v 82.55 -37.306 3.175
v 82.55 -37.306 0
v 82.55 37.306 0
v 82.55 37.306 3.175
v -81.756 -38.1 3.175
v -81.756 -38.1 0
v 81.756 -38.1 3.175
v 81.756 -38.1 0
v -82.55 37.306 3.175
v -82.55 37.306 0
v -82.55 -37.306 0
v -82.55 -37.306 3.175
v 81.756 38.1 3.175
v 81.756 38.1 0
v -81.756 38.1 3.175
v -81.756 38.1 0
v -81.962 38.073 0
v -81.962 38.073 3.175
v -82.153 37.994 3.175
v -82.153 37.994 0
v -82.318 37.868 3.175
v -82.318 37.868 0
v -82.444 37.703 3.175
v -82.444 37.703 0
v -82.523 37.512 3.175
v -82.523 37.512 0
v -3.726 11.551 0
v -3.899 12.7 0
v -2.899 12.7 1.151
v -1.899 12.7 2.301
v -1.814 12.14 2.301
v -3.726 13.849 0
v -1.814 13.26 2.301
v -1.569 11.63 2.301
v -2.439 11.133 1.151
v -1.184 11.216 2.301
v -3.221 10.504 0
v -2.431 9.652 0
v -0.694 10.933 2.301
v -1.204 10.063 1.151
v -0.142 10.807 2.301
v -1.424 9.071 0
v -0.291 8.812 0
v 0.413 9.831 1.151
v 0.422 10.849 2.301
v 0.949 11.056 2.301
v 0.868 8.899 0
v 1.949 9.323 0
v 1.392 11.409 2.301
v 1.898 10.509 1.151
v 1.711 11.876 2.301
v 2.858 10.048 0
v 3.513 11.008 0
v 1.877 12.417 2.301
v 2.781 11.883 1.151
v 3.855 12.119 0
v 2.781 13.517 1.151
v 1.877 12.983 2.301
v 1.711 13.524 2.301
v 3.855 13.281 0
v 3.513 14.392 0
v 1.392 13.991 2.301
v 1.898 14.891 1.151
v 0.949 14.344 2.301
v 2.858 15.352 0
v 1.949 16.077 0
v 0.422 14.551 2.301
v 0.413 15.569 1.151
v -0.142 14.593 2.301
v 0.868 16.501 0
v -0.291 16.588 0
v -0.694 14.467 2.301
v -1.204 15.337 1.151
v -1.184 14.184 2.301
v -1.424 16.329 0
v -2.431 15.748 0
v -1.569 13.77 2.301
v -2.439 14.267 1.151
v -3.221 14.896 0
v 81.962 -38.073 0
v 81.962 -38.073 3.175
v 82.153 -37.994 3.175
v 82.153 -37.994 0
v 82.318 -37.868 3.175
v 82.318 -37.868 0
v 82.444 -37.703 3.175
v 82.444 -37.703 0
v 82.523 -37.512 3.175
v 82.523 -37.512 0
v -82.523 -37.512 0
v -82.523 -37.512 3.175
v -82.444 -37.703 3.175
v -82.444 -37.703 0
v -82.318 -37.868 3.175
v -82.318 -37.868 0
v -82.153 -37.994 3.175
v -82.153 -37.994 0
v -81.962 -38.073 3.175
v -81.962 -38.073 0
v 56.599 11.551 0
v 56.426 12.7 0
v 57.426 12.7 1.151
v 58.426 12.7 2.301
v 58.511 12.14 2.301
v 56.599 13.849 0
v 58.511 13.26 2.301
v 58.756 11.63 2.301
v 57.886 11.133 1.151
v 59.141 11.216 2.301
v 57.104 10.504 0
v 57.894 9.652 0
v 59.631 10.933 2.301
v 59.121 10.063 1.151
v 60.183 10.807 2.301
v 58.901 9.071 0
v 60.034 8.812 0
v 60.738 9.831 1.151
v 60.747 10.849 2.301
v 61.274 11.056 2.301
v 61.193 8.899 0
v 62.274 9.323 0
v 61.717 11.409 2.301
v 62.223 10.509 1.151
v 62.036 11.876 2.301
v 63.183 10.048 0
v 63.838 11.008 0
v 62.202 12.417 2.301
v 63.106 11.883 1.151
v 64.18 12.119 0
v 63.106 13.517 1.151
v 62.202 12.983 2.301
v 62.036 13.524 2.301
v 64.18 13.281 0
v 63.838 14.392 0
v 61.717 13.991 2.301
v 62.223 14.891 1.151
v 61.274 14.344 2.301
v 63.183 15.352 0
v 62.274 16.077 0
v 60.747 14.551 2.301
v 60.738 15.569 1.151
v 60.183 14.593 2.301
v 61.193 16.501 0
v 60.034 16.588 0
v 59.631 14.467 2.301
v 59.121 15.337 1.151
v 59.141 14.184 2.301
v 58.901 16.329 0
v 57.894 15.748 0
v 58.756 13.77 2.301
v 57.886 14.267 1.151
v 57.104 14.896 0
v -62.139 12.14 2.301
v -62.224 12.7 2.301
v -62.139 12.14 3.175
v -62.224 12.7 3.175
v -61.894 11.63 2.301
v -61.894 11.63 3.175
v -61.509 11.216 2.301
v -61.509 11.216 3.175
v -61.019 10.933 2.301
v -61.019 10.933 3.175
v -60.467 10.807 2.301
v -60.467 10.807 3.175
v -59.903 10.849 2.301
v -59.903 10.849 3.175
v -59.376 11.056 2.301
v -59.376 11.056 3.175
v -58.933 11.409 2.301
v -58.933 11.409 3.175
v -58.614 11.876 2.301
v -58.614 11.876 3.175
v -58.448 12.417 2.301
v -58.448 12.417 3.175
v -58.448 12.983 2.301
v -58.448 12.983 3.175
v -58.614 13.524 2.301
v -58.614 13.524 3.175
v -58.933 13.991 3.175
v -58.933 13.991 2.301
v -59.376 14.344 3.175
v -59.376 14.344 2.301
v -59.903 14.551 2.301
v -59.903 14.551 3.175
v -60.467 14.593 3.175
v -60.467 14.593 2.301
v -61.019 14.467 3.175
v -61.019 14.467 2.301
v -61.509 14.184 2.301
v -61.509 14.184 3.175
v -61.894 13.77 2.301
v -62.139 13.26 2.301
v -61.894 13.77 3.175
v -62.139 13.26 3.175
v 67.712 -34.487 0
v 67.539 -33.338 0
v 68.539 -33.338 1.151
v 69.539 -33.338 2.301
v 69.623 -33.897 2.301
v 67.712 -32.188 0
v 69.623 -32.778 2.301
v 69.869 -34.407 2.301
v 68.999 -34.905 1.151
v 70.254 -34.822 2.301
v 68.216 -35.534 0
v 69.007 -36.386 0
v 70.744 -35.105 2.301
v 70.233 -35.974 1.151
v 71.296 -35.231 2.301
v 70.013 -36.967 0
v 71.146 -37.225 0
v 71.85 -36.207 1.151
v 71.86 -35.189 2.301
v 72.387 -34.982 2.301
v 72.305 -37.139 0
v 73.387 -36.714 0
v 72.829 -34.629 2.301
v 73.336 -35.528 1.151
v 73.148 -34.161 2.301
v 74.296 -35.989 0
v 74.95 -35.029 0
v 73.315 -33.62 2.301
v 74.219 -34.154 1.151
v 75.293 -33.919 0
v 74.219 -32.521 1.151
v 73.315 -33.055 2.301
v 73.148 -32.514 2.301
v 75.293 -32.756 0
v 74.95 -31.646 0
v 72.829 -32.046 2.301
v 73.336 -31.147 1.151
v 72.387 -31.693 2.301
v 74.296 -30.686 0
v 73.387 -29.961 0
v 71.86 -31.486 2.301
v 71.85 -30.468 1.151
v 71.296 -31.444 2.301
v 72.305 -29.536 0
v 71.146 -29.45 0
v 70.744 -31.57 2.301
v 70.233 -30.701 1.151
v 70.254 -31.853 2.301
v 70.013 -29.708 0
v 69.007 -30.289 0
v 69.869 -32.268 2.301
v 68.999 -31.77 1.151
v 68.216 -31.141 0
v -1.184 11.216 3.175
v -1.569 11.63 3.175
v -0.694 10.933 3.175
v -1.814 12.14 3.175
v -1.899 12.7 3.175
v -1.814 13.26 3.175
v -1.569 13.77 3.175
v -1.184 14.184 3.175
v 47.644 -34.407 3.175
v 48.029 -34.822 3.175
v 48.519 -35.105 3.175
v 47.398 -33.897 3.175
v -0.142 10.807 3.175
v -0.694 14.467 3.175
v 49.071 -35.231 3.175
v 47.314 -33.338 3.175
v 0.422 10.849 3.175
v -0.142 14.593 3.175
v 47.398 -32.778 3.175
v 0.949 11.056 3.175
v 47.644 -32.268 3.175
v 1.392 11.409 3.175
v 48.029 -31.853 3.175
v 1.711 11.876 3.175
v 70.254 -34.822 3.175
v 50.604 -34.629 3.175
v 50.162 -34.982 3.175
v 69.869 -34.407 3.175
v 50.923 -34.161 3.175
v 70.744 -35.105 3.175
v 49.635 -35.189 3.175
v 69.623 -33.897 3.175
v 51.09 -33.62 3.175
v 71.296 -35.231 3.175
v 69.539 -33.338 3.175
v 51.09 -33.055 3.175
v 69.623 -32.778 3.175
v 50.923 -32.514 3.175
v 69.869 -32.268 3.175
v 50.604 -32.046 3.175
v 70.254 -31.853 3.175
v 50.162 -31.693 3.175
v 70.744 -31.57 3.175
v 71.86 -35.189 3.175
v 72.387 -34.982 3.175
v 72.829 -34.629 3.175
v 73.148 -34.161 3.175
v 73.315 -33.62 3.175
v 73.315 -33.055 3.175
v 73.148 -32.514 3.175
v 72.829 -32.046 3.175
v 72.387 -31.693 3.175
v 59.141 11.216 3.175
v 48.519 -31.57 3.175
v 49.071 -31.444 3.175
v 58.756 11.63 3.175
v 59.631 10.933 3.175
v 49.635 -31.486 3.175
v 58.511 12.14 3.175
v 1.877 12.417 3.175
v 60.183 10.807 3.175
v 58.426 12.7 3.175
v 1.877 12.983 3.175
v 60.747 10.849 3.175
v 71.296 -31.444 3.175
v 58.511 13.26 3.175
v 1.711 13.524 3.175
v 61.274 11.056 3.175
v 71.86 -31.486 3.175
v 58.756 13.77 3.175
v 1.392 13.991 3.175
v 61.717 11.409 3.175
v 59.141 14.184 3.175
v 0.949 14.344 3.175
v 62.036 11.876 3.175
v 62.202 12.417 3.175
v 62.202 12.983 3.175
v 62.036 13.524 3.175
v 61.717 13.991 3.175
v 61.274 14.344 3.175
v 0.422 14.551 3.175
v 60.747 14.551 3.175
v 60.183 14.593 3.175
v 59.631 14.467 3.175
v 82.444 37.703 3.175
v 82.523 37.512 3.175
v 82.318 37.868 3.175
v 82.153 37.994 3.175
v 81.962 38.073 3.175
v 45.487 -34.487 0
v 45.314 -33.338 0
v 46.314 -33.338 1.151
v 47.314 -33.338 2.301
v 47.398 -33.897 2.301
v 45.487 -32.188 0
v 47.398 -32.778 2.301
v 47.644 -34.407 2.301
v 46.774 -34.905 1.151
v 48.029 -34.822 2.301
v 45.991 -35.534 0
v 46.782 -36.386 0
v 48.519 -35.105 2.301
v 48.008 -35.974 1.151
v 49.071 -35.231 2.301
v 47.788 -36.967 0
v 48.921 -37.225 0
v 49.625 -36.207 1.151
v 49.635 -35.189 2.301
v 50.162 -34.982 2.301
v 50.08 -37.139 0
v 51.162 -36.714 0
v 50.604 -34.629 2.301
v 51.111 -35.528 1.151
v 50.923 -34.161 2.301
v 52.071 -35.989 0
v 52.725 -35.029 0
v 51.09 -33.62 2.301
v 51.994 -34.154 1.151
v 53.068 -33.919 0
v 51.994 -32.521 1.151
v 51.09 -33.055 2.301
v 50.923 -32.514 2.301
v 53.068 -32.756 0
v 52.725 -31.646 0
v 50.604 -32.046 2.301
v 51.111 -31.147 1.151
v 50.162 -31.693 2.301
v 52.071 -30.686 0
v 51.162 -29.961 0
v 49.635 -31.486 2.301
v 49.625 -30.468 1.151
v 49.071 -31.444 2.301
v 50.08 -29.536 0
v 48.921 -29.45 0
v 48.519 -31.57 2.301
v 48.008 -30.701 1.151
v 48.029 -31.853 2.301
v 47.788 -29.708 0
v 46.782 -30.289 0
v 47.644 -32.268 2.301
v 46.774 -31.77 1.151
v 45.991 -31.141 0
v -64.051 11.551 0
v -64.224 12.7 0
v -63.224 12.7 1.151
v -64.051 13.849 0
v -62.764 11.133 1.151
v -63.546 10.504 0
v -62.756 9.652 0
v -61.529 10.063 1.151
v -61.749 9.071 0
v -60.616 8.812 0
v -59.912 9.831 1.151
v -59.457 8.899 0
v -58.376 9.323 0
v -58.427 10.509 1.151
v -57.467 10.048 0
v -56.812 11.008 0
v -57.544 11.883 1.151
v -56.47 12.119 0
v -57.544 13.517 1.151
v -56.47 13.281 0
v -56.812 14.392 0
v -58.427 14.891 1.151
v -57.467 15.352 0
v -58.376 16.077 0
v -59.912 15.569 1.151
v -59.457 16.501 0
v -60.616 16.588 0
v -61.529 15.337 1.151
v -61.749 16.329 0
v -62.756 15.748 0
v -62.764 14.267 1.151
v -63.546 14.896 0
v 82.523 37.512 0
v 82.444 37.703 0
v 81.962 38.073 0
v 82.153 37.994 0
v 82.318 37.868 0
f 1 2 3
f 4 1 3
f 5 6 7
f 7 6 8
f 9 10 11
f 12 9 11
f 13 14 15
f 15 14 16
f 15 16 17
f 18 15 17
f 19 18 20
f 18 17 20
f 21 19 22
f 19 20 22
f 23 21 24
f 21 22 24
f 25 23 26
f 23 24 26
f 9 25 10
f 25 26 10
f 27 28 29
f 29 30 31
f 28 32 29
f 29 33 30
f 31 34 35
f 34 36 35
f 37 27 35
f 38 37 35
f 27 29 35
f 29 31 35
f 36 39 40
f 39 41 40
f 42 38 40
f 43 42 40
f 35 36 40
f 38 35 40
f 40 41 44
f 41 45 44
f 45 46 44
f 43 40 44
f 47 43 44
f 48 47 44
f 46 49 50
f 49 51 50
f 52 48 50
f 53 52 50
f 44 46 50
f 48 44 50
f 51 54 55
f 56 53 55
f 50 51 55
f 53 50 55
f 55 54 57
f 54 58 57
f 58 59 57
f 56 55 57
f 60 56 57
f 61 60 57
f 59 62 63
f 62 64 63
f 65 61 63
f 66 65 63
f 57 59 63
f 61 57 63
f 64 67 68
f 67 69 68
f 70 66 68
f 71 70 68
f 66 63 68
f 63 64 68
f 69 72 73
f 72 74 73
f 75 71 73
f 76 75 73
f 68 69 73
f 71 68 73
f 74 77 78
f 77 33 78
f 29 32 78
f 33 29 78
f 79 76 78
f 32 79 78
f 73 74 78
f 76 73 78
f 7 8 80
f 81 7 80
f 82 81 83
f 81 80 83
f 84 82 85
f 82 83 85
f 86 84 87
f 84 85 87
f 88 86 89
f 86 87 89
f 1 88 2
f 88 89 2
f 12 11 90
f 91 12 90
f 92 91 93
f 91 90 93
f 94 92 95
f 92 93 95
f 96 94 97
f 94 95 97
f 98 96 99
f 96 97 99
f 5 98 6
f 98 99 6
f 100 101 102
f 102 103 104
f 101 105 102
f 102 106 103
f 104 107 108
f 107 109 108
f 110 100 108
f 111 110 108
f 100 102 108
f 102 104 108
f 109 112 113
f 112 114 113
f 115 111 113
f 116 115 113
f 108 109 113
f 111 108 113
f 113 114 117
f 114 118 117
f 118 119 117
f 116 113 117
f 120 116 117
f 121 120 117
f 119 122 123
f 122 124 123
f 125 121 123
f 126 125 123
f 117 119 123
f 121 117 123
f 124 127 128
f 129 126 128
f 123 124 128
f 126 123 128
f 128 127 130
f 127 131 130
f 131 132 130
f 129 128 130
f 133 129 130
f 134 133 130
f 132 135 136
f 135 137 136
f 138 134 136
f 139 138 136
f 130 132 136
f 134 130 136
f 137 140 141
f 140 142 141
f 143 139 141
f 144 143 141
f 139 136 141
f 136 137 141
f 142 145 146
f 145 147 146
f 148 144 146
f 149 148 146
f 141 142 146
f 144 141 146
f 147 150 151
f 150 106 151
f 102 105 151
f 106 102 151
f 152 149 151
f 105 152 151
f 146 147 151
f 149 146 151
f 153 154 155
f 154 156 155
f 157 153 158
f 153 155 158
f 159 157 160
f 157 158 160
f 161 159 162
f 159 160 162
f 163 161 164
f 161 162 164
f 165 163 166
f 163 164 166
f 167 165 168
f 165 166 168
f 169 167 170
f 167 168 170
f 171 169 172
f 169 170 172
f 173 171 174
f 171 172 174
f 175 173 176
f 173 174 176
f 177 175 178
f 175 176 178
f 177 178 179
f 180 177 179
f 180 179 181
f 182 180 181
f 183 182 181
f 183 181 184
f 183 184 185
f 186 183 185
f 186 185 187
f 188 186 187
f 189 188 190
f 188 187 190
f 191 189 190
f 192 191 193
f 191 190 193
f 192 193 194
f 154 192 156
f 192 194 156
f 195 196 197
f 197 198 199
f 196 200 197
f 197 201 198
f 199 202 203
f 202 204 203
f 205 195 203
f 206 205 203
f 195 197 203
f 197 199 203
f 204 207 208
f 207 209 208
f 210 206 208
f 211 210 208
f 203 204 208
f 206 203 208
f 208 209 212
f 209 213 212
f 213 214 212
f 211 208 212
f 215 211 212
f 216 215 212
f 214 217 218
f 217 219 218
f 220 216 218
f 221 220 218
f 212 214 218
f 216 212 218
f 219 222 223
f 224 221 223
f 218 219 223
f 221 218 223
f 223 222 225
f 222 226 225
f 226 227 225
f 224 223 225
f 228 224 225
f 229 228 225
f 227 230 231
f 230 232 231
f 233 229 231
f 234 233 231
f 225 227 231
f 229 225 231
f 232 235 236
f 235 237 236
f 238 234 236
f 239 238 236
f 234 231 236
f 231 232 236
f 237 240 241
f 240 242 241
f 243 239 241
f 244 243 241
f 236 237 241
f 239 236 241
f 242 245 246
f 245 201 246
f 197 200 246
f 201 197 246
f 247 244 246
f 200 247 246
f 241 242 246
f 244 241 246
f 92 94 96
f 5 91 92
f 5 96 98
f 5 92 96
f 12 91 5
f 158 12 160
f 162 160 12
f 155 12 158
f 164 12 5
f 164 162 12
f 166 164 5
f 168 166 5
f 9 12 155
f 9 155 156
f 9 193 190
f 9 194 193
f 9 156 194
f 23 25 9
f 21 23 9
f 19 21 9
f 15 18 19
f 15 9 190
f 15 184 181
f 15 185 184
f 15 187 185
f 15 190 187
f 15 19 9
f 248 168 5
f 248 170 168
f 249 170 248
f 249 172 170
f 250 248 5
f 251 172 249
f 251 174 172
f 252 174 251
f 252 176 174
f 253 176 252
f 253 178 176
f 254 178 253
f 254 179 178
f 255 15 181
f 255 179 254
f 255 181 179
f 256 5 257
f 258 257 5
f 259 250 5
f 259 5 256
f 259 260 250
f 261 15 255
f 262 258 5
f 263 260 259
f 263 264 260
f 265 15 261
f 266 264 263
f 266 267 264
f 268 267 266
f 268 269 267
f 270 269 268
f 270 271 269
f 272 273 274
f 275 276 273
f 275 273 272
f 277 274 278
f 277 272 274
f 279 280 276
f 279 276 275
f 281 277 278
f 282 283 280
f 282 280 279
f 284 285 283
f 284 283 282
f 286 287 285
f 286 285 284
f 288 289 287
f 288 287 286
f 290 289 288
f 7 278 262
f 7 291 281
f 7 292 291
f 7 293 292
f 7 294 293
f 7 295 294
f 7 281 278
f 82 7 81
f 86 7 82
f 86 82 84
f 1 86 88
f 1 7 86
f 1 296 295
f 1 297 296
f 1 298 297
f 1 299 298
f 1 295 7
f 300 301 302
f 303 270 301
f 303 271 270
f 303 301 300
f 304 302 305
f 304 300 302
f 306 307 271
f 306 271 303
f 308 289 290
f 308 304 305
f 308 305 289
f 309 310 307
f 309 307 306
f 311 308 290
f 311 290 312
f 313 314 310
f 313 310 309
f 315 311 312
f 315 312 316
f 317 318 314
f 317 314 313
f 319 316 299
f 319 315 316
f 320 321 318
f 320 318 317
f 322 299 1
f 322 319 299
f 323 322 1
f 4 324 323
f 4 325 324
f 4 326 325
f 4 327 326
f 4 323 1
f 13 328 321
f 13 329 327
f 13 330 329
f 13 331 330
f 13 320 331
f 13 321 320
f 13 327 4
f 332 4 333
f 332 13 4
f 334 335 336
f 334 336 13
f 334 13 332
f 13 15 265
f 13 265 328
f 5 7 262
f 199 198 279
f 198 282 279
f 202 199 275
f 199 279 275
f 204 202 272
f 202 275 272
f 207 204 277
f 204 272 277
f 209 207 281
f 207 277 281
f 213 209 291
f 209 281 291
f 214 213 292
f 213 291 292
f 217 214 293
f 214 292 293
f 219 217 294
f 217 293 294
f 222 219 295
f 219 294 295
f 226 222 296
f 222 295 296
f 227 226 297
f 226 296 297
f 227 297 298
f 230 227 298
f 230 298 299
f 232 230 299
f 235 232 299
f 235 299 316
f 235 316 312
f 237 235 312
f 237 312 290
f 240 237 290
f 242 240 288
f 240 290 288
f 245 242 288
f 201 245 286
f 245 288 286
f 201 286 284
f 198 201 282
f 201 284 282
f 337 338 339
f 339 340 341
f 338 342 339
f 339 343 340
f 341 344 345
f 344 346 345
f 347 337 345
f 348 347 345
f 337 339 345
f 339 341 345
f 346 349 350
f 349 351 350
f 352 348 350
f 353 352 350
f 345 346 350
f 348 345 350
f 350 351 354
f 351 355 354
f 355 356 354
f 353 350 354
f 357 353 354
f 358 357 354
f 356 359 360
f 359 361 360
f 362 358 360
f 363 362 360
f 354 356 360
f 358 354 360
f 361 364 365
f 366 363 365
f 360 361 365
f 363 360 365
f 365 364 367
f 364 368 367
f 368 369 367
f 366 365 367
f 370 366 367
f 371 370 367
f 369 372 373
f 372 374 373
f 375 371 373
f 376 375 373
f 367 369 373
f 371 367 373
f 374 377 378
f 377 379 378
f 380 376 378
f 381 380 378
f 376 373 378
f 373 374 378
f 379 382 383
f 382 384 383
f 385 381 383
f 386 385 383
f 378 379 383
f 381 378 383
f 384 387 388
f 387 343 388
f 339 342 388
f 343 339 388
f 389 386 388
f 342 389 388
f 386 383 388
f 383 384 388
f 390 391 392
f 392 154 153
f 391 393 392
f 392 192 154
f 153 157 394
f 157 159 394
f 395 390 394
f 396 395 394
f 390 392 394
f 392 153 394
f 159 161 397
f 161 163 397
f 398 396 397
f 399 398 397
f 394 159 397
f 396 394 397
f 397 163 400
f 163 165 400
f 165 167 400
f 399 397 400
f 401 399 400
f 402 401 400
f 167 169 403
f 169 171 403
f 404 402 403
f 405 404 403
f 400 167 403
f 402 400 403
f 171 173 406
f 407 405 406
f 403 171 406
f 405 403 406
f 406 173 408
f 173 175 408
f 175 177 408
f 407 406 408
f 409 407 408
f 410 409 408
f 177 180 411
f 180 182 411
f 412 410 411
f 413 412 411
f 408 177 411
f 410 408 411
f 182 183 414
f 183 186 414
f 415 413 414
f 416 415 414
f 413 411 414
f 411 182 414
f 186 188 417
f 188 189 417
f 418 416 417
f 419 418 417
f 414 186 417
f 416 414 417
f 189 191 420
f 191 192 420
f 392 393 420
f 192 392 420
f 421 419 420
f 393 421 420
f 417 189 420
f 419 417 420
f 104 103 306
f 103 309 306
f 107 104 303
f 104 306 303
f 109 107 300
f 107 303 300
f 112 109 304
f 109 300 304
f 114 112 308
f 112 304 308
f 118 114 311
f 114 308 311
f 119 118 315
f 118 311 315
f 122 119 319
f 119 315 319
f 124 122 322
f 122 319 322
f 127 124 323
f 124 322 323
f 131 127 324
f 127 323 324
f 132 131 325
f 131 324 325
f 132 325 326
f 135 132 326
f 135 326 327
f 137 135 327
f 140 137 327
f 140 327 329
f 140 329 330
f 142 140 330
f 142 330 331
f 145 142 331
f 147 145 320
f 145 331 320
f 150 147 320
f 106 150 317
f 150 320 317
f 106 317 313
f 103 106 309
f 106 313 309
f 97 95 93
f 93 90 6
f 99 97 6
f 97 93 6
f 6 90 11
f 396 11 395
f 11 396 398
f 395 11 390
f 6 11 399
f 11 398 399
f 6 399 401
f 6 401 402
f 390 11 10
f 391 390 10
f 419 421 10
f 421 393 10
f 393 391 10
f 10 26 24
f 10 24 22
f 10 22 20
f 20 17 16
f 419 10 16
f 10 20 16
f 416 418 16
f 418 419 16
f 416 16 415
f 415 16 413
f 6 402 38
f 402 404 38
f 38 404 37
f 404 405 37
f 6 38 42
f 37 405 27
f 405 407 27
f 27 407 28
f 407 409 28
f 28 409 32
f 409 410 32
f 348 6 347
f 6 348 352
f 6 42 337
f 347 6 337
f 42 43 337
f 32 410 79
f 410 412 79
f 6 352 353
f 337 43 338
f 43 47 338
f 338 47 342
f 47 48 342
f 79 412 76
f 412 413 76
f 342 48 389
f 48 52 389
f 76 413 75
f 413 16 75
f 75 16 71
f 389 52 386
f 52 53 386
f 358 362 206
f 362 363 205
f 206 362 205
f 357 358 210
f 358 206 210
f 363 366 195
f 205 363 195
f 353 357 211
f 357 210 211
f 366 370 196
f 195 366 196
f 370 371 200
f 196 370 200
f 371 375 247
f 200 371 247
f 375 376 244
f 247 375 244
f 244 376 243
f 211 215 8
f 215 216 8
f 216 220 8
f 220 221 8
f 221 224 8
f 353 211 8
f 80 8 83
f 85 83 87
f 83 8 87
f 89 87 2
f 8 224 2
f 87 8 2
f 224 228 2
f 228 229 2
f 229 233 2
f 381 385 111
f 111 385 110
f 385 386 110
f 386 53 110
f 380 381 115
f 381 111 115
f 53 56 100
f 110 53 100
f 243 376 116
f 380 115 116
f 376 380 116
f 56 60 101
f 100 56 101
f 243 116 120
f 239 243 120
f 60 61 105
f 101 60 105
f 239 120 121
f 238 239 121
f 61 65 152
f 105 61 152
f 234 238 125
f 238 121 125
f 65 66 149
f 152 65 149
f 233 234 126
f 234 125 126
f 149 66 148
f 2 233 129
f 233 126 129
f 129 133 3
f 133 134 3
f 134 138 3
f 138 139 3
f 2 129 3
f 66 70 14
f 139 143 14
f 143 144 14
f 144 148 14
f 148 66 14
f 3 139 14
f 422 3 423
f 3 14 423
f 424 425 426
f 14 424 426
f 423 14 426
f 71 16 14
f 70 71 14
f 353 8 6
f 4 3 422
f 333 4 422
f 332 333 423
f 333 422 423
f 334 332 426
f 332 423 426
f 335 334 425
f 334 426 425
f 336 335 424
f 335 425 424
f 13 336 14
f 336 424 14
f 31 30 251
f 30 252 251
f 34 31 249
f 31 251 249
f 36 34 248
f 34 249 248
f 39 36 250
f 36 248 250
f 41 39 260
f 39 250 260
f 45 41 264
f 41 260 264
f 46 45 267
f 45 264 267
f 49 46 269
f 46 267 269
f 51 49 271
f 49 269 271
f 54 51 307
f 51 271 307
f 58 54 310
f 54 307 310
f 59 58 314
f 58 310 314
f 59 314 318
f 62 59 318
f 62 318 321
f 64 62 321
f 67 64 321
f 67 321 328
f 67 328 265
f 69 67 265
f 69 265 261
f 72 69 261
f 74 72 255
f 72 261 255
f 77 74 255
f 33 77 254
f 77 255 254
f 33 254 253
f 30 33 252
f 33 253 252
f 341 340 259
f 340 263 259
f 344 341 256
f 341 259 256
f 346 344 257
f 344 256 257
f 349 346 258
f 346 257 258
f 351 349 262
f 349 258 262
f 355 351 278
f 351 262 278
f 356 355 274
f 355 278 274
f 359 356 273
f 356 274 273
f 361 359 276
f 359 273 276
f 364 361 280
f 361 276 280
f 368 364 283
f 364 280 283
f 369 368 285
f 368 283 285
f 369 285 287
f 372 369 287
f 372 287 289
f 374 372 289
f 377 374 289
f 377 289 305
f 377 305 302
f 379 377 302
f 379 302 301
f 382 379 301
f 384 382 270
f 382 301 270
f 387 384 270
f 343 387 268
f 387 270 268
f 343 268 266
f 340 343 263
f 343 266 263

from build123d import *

# Parameters (mm, degrees)
F1_DEPTH       = 3.175
F2_D           = 3.7973
F2_CSINK_D     = 7.7978
F2_CSINK_ANGLE = 82


# Not quite as in the source:
# - a feature of the source that left no trace in its solid (it failed there, or was rolled back) is left out


with BuildPart() as f1:
    # F0 (on Top) → F1 (new body)
    with BuildSketch(Plane.XY):
        with BuildLine():
            Line((81.75625, 38.1), (-81.75625, 38.1))
            ThreePointArc((-81.75625, 38.1), (-82.3175160076, 37.8675160076), (-82.55, 37.30625))
            Line((-82.55, 37.30625), (-82.55, -37.30625))
            ThreePointArc((-82.55, -37.30625), (-82.3175160076, -37.8675160076), (-81.75625, -38.1))
            Line((-81.75625, -38.1), (81.75625, -38.1))
            ThreePointArc((81.75625, -38.1), (82.3175160076, -37.8675160076), (82.55, -37.30625))
            Line((82.55, -37.30625), (82.55, 37.30625))
            ThreePointArc((82.55, 37.30625), (82.3175160076, 37.8675160076), (81.75625, 38.1))
        make_face()
    extrude(amount=F1_DEPTH)

    # F2 (through all)
    with Locations(Plane(origin=(0, 0, 0), x_dir=(1, 0, 0), z_dir=(0, 0, -1))):
        with Locations((49.2125, 33.3375), (71.4375, 33.3375), (60.325, -12.7), (0, -12.7), (-60.325, -12.7)):
            CounterSinkHole(F2_D / 2, F2_CSINK_D / 2, counter_sink_angle=F2_CSINK_ANGLE)


solid = f1.part
